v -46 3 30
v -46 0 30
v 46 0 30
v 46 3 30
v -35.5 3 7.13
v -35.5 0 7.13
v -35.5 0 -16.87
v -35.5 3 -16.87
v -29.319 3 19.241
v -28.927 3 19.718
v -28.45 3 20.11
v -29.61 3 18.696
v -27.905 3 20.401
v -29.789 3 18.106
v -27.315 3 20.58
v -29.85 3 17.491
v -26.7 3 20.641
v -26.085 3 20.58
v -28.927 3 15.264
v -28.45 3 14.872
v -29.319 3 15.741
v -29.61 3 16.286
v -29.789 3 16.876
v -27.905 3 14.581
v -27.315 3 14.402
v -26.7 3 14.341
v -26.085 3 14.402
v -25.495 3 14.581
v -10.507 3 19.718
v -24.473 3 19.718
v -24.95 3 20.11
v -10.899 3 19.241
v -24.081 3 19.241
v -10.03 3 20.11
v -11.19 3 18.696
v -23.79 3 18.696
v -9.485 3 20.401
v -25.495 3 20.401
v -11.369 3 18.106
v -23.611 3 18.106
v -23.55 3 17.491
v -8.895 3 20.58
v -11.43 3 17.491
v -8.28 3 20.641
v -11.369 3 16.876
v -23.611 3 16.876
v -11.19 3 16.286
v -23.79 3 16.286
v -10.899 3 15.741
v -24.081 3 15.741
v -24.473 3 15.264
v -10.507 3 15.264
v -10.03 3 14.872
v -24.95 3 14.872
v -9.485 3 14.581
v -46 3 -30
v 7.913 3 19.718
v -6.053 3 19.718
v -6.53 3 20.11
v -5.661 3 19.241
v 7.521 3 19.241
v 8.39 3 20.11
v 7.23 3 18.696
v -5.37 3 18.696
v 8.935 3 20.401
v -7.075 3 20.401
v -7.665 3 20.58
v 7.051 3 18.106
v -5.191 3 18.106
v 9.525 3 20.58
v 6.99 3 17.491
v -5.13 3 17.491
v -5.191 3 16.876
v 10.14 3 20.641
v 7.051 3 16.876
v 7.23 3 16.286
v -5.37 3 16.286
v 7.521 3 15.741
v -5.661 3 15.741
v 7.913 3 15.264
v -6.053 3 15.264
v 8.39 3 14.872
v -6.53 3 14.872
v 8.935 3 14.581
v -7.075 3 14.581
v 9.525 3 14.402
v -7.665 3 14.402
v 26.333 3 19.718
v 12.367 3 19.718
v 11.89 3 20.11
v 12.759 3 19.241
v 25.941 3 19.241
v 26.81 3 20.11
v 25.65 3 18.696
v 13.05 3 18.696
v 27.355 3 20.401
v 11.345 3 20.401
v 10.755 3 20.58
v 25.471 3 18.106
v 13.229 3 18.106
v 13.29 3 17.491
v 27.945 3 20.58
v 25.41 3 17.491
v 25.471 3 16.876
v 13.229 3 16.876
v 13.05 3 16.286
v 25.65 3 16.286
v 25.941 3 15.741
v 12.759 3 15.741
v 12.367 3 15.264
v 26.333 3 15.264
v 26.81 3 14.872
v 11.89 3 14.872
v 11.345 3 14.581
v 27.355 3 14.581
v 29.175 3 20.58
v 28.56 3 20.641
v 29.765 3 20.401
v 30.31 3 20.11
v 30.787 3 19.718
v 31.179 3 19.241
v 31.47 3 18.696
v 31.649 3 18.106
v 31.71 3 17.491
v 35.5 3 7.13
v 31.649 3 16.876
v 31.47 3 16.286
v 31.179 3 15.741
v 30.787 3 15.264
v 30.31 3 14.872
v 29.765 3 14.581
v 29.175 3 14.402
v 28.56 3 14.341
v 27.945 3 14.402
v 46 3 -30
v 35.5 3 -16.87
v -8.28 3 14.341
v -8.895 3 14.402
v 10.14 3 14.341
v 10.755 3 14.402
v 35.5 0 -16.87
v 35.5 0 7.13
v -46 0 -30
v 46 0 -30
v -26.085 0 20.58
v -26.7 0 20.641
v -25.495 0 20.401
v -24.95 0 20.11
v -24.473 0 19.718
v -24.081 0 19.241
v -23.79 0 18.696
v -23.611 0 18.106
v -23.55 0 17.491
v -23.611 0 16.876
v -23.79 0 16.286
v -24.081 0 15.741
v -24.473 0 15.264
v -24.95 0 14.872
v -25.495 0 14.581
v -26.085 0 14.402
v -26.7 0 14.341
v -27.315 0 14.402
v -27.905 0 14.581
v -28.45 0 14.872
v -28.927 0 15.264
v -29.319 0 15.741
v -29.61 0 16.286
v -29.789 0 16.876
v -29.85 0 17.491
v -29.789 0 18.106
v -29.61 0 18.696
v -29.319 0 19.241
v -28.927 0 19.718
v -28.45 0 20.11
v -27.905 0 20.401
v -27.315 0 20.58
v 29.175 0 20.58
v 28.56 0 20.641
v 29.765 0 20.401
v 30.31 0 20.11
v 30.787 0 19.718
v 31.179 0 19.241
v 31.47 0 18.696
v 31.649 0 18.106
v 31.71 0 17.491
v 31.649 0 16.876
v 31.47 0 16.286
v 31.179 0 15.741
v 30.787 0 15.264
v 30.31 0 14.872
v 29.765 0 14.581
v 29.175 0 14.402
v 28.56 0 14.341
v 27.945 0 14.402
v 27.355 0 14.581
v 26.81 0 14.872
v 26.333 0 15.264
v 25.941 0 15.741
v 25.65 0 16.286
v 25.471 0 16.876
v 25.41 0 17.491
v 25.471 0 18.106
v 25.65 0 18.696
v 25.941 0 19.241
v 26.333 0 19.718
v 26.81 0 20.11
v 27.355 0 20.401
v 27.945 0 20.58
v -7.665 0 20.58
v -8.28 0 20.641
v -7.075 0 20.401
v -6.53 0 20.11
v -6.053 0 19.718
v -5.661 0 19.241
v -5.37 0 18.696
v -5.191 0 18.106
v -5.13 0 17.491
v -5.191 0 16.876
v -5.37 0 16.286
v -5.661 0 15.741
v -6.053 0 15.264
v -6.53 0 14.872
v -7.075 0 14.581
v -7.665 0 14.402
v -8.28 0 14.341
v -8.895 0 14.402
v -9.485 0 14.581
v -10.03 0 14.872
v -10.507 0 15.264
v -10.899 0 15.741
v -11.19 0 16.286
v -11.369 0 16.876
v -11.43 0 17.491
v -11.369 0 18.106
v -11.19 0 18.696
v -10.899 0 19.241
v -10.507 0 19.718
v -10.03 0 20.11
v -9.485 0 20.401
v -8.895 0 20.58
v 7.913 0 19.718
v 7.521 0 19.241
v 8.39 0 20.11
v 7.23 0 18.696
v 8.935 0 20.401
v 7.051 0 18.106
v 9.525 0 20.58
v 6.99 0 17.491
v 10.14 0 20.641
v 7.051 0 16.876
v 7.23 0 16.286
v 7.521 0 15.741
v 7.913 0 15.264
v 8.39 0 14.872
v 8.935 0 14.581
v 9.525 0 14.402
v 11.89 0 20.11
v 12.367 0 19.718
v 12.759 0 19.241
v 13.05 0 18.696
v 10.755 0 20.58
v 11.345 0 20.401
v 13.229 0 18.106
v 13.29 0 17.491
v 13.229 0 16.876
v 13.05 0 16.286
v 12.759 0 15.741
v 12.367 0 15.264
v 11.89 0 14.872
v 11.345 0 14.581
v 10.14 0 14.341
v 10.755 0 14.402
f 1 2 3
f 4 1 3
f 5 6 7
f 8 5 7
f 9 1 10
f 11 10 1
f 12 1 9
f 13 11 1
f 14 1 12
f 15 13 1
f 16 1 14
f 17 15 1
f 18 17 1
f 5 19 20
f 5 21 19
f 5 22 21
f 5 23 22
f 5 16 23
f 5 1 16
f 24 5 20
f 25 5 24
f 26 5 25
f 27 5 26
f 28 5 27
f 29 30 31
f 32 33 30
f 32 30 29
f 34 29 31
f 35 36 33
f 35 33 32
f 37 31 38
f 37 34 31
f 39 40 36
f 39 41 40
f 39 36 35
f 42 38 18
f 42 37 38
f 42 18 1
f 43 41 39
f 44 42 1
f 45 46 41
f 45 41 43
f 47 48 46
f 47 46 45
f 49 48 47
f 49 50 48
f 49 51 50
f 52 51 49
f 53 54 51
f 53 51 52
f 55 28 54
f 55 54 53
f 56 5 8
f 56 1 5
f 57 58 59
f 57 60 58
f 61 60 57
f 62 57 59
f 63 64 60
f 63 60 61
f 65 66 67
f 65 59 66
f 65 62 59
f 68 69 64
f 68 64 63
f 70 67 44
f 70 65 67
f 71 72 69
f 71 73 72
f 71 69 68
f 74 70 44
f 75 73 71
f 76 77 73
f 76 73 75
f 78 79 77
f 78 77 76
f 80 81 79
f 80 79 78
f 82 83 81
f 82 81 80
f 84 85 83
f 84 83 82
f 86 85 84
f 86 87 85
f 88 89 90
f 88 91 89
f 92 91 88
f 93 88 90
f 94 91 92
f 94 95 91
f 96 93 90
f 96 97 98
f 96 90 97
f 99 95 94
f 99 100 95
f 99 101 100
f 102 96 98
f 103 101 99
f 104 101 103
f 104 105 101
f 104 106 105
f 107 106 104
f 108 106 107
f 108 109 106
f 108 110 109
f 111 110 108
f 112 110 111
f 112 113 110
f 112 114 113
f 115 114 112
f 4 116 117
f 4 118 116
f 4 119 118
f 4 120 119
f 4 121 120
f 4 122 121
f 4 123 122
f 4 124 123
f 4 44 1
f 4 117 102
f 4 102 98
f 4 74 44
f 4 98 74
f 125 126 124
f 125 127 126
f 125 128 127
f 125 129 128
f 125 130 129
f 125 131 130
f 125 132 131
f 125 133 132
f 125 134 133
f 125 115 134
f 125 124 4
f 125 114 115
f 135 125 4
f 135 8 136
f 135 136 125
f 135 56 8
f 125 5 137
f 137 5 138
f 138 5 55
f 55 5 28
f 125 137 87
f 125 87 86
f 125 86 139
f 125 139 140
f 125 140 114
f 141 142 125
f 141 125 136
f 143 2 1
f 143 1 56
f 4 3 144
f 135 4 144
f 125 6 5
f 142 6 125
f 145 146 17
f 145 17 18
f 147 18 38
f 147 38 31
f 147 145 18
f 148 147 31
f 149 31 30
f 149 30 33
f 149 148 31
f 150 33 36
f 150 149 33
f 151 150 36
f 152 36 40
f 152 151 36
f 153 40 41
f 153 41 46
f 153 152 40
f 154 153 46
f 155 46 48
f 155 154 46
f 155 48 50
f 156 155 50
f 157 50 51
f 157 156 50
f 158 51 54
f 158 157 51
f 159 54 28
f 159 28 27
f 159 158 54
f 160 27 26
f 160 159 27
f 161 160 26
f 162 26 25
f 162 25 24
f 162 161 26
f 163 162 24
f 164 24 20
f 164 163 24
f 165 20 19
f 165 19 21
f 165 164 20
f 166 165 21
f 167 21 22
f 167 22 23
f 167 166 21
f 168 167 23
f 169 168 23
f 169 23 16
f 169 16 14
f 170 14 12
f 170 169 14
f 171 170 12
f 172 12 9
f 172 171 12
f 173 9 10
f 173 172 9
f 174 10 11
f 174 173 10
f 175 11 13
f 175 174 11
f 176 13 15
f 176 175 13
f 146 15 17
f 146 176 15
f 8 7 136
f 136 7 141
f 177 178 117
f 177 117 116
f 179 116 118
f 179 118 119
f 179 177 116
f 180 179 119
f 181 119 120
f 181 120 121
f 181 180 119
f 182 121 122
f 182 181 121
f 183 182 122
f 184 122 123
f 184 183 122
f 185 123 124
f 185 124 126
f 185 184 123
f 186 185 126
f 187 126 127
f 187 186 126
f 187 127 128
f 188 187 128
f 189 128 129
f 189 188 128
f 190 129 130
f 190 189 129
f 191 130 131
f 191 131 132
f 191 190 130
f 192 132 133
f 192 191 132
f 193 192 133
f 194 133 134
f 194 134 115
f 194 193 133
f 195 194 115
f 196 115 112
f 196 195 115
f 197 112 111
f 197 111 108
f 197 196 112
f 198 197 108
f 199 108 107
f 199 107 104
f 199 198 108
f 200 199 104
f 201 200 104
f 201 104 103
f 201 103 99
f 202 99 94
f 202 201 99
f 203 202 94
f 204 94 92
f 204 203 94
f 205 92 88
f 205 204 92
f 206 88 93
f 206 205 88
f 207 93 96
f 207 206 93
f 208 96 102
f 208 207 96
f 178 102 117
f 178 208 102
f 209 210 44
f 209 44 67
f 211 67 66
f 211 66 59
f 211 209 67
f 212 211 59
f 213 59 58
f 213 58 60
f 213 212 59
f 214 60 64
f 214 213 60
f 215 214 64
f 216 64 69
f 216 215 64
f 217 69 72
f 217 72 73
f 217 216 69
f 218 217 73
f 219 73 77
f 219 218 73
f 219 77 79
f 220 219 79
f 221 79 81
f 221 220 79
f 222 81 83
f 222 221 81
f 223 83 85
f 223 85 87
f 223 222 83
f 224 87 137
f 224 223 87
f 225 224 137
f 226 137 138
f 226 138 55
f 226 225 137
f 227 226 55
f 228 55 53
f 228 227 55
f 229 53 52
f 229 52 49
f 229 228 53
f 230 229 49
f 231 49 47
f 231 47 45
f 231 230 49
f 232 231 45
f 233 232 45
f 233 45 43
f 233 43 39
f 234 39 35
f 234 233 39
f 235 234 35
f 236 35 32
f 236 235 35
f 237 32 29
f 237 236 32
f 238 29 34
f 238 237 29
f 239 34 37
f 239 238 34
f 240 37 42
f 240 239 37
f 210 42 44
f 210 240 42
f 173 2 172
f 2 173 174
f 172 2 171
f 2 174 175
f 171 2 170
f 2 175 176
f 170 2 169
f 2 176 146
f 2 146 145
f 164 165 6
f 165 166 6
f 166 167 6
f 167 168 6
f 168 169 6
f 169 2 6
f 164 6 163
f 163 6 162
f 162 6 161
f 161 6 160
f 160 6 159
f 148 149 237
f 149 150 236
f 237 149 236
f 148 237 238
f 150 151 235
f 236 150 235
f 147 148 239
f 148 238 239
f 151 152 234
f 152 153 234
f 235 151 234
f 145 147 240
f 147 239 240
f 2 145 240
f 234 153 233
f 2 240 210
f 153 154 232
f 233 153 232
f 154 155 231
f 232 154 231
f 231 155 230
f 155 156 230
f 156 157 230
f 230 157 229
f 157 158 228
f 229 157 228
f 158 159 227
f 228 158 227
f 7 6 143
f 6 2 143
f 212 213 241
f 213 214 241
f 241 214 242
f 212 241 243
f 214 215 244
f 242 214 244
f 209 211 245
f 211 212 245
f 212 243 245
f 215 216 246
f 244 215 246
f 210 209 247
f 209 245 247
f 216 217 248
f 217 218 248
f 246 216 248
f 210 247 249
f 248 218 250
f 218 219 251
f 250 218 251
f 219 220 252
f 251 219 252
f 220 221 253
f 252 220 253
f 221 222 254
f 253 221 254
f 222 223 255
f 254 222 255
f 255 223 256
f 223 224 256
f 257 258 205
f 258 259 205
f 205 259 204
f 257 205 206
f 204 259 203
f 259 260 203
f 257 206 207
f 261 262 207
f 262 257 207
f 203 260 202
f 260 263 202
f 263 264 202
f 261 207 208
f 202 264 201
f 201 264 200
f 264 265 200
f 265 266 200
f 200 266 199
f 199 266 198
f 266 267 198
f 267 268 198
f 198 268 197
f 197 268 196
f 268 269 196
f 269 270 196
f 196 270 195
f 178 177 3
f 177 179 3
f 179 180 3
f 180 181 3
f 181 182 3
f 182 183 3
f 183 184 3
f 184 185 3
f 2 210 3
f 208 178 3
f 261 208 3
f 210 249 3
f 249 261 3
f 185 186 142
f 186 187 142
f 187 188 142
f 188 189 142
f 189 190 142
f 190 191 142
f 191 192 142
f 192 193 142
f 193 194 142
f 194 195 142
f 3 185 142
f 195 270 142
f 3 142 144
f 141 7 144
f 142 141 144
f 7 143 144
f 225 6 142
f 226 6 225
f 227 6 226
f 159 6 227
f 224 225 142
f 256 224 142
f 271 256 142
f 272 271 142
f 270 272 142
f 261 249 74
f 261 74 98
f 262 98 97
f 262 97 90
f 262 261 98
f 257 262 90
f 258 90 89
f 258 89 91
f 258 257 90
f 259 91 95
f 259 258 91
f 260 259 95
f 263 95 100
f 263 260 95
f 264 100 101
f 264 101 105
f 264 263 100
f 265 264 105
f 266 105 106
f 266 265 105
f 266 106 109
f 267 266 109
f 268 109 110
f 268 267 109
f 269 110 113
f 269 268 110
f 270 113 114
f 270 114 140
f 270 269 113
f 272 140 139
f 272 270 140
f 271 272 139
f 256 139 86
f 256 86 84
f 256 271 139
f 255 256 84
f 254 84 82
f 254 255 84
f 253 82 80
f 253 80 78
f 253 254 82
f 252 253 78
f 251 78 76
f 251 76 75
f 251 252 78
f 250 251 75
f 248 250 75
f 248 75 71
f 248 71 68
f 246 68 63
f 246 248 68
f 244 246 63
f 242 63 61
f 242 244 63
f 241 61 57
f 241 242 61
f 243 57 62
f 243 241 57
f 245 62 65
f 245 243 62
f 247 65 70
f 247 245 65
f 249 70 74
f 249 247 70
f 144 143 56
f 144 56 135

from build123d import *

# Parameters (mm, degrees)
SKETCH1_W           = 92
SKETCH1_H           = 60
SKETCH1_R           = 3.15
SKETCH1_W_2         = 71
SKETCH1_H_2         = 24
BOSS_EXTRUDE1_DEPTH = 3


with BuildPart() as part:
    # Sketch1 → Boss-Extrude1 (new body)
    with BuildSketch(Plane(origin=(0, 0, 0), x_dir=(1, 0, 0), z_dir=(0, 1, 0))):
        Rectangle(SKETCH1_W, SKETCH1_H)
        with Locations(Location((-26.7, -17.491017964, 0), (0, 0, 270))):
            Circle(SKETCH1_R, mode=Mode.SUBTRACT)
        with Locations(Location((-8.28, -17.491017964, 0), (0, 0, 270))):
            Circle(SKETCH1_R, mode=Mode.SUBTRACT)
        with Locations(Location((10.14, -17.491017964, 0), (0, 0, 270))):
            Circle(SKETCH1_R, mode=Mode.SUBTRACT)
        with Locations(Location((28.56, -17.491017964, 0), (0, 0, 270))):
            Circle(SKETCH1_R, mode=Mode.SUBTRACT)
        with Locations((0, 4.87)):
            Rectangle(SKETCH1_W_2, SKETCH1_H_2, mode=Mode.SUBTRACT)
    extrude(amount=BOSS_EXTRUDE1_DEPTH)


solid = part.part
